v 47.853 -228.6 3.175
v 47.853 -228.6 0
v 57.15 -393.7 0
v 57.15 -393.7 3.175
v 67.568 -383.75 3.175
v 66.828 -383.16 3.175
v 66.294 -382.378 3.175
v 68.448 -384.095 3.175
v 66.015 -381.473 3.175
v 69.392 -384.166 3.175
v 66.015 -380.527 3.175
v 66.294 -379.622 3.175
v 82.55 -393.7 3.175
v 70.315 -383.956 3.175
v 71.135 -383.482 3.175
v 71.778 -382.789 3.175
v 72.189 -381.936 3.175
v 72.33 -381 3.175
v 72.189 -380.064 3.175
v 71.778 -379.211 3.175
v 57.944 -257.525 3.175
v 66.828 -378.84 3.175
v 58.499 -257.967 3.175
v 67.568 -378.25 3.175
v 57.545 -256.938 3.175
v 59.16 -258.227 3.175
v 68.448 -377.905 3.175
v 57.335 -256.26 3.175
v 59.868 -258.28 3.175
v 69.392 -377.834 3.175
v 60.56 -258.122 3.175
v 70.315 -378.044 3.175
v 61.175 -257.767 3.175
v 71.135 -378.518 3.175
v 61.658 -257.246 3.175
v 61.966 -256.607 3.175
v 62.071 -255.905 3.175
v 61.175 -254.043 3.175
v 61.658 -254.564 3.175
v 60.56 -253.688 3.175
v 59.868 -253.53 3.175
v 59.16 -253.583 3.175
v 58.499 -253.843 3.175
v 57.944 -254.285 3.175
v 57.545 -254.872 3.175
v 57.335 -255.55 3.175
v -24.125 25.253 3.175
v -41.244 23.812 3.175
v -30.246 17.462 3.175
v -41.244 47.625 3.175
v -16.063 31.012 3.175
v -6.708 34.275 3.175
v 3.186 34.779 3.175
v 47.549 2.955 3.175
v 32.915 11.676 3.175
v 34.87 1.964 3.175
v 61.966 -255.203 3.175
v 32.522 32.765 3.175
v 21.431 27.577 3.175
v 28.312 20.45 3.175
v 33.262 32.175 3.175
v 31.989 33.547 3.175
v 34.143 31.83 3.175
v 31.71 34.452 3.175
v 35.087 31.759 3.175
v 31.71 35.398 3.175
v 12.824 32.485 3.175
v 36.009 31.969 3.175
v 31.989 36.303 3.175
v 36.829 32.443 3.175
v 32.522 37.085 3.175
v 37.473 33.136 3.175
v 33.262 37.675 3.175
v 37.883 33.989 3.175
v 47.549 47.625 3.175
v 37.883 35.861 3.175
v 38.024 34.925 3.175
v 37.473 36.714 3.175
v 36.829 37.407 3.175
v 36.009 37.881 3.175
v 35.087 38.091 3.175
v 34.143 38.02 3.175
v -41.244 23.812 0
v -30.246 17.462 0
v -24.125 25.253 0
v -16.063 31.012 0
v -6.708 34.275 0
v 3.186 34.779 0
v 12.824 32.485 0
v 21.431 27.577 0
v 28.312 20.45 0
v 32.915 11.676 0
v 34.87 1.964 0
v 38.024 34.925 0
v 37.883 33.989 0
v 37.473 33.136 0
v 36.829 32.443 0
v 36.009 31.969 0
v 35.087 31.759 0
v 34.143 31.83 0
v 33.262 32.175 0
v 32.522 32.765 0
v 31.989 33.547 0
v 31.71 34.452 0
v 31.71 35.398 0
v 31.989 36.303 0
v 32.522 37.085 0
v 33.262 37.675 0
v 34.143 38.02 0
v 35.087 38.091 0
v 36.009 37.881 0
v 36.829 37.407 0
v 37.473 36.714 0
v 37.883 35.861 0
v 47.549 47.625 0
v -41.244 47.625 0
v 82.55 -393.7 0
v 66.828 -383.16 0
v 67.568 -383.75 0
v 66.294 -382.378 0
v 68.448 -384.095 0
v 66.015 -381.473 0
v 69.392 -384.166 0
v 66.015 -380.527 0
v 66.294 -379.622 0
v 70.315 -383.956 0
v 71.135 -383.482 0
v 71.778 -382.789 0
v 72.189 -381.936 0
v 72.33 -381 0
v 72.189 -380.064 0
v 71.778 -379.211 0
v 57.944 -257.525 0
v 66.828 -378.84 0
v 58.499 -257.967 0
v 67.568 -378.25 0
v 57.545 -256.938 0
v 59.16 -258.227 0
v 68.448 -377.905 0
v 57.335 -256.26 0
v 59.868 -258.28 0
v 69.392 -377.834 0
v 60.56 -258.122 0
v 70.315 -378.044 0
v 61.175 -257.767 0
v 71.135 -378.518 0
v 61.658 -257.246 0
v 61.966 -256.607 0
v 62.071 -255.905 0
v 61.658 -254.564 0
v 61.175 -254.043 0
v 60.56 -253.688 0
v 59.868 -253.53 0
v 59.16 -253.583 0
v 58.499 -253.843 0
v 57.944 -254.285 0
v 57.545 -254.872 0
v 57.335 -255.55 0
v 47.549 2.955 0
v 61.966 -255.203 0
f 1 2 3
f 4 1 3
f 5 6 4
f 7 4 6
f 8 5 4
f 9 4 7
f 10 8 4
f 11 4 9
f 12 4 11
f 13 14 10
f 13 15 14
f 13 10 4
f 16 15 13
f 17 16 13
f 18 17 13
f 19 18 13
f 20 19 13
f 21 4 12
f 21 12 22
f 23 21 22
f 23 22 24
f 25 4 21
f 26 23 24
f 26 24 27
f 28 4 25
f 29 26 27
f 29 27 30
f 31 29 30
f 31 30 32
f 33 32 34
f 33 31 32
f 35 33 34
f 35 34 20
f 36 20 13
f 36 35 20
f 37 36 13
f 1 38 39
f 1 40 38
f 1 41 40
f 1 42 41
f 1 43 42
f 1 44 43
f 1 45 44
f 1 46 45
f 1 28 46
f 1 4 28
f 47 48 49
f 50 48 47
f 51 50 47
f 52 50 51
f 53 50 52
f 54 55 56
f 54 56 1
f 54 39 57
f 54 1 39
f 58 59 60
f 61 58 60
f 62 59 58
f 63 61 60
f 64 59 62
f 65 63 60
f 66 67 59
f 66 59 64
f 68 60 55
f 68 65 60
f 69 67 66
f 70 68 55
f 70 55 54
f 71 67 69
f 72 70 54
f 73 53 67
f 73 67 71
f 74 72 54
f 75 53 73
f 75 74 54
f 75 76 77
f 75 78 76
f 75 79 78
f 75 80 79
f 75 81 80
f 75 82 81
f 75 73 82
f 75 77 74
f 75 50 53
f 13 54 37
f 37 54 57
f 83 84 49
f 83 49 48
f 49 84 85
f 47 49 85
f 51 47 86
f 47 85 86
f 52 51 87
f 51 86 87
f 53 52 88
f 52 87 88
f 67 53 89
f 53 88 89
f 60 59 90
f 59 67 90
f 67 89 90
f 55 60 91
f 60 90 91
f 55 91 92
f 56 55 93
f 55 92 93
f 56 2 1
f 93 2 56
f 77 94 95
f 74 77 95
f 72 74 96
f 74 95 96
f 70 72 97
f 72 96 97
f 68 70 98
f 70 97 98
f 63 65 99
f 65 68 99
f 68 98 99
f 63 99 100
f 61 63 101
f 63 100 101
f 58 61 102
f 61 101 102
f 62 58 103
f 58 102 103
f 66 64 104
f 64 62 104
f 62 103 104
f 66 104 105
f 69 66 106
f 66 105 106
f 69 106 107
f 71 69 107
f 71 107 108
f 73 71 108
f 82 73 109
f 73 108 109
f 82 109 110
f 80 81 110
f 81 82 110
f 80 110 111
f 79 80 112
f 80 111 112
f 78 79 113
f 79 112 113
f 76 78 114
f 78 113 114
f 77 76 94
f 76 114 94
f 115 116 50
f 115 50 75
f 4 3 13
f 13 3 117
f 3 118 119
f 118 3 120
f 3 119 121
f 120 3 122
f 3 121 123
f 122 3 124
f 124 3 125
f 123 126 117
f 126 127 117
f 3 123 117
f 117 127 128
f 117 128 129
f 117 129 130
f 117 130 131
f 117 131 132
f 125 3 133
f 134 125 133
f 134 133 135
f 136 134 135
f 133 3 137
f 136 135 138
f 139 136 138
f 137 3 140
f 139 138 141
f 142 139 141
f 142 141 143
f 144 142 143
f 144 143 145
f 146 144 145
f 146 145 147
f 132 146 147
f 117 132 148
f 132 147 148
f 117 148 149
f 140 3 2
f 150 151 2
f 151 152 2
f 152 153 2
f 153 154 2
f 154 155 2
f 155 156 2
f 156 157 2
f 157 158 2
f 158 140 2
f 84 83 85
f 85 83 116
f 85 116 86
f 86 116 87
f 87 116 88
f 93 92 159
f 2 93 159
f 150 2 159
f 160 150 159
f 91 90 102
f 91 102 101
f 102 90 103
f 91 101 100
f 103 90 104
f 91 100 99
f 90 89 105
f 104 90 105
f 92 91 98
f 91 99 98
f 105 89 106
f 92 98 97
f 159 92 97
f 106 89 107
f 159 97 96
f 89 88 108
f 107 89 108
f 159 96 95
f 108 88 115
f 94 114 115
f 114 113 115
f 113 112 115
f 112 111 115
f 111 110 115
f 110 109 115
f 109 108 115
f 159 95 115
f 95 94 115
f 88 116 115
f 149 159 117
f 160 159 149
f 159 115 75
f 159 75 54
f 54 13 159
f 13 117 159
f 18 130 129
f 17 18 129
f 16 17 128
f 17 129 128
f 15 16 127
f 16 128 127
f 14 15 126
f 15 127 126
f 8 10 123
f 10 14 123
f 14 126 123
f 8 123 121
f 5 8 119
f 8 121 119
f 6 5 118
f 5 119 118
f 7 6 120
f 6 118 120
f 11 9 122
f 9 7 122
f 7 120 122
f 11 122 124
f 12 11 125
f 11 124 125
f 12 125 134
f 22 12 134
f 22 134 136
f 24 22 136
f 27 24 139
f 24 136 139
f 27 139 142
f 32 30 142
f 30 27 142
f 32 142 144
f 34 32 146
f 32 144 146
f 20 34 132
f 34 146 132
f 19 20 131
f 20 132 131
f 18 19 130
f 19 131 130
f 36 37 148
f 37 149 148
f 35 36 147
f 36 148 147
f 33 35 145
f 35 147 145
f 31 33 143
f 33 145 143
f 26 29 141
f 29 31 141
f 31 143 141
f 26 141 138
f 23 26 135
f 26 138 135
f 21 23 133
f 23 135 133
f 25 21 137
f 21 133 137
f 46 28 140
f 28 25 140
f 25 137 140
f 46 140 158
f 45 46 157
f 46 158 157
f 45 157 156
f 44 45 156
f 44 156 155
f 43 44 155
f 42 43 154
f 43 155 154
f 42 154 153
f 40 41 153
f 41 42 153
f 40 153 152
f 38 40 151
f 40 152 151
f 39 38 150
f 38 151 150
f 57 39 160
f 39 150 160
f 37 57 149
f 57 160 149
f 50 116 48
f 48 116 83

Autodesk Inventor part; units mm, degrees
ref_plane "YZ Plane" through (0, 0, 0) normal (1, 0, 0) x (0, 1, 0)
ref_plane "XZ Plane" through (0, 0, 0) normal (0, 1, 0) x (-1, 0, 0)
ref_plane "XY Plane" through (0, 0, 0) normal (0, 0, 1) x (1, 0, 0)
sketch "Sketch1" plane through (0, 0, 0) normal (0, 0, 1) x (1, 0, 0)
  arc A0 (34.8698, 1.9636) -> (-30.2459, 17.4625) centre (0, 0) ccw
  line L0 (-30.2459, 17.4625) -> (-41.2445, 23.8125)
  line L1 (0, 0) -> (-58.2409, 0) construction
  line L2 (47.853, -228.6) -> (34.8698, 1.9636)
  line L3 (82.55, -393.7) -> (47.4407, 4.1861)
  line L4 (57.15, -393.7) -> (82.55, -393.7)
  circle A1 centre (69.155, -381) radius 3.175
  line L5 (47.5493, 47.625) -> (47.5493, 2.9548)
  line L6 (-41.2445, 47.625) -> (-41.2445, 23.8125)
  line L7 (-41.2445, 47.625) -> (161.9555, 47.625) construction
  line L8 (-41.2445, 47.625) -> (161.9555, 47.625) construction
  line L9 (-41.2445, 47.625) -> (161.9555, 47.625) construction
  line L10 (-41.2445, 47.625) -> (161.9555, 47.625) construction
  line L11 (-41.2445, 47.625) -> (47.5493, 47.625)
  line L12 (47.853, -228.6) -> (57.15, -393.7)
  circle A2 centre (59.69, -255.905) radius 2.3813
  circle A3 centre (34.8493, 34.925) radius 3.175
  point P0 (47.5493, 25.2899)
  point P1 (51.4288, -292.1)
  dimension "d0" = 69.85
  dimension "d1" = 30
  dimension "d2" = 57.15
  dimension "d3" = 25.4
  dimension "d4" = 393.7
  dimension "d5" = 6.35
  dimension "d6" = 12.7
  dimension "d7" = 12.7
  dimension "d72" = 4.7625
  dimension "d73" = 2.54
  dimension "d74" = 137.795
  dimension "d76" = 6.35
  dimension "d77" = 12.7
  dimension "d78" = 12.7
extrude "Plate10" add sketch "Sketch1" along normal blind 3.175
equation "\"BendRadius\" = Thickness"
equation "\"BendReliefWidth\" = Thickness"
equation "\"BendReliefDepth\" = 0.5 * Thickness"
equation "\"CornerReliefSize\" = 4 * Thickness"
equation "\"MinimumRemnant\" = 2 * Thickness"
equation "\"TransitionRadius\" = BendRadius"
equation "\"JacobiRadiusSize\" = BendRadius"
equation "\"GapSize\" = Thickness"
equation "\"d10\" = BendRadius"
equation "\"d28\" = BendRadius"
equation "\"d71\" = BendRadius"
equation "\"d75\" = BendRadius"
equation "\"d79\" = BendRadius"
equation "\"Thickness\" = 3.175"
properties part number "PassiveHooks2"
